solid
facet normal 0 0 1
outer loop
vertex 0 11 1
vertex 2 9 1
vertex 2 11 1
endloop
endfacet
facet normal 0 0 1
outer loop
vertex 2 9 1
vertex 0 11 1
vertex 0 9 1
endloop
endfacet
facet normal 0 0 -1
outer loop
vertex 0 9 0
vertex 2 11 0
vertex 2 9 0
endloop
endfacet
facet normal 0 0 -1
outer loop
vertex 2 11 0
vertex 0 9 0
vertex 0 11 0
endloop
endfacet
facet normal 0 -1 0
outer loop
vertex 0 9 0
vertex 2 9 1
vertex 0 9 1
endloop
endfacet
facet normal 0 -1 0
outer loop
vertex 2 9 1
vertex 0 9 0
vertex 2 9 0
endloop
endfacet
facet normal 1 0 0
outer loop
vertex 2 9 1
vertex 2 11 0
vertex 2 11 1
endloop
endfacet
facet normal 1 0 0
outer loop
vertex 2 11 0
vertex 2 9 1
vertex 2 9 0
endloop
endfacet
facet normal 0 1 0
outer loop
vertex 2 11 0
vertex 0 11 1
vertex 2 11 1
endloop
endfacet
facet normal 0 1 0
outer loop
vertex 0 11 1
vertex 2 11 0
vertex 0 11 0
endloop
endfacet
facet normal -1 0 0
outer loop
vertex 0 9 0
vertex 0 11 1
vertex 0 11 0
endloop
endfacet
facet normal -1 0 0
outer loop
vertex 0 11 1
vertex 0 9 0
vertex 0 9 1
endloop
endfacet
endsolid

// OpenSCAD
union() {
  translate([0, 9, 0]) cube(size=[2,2,1], center=false);
}
